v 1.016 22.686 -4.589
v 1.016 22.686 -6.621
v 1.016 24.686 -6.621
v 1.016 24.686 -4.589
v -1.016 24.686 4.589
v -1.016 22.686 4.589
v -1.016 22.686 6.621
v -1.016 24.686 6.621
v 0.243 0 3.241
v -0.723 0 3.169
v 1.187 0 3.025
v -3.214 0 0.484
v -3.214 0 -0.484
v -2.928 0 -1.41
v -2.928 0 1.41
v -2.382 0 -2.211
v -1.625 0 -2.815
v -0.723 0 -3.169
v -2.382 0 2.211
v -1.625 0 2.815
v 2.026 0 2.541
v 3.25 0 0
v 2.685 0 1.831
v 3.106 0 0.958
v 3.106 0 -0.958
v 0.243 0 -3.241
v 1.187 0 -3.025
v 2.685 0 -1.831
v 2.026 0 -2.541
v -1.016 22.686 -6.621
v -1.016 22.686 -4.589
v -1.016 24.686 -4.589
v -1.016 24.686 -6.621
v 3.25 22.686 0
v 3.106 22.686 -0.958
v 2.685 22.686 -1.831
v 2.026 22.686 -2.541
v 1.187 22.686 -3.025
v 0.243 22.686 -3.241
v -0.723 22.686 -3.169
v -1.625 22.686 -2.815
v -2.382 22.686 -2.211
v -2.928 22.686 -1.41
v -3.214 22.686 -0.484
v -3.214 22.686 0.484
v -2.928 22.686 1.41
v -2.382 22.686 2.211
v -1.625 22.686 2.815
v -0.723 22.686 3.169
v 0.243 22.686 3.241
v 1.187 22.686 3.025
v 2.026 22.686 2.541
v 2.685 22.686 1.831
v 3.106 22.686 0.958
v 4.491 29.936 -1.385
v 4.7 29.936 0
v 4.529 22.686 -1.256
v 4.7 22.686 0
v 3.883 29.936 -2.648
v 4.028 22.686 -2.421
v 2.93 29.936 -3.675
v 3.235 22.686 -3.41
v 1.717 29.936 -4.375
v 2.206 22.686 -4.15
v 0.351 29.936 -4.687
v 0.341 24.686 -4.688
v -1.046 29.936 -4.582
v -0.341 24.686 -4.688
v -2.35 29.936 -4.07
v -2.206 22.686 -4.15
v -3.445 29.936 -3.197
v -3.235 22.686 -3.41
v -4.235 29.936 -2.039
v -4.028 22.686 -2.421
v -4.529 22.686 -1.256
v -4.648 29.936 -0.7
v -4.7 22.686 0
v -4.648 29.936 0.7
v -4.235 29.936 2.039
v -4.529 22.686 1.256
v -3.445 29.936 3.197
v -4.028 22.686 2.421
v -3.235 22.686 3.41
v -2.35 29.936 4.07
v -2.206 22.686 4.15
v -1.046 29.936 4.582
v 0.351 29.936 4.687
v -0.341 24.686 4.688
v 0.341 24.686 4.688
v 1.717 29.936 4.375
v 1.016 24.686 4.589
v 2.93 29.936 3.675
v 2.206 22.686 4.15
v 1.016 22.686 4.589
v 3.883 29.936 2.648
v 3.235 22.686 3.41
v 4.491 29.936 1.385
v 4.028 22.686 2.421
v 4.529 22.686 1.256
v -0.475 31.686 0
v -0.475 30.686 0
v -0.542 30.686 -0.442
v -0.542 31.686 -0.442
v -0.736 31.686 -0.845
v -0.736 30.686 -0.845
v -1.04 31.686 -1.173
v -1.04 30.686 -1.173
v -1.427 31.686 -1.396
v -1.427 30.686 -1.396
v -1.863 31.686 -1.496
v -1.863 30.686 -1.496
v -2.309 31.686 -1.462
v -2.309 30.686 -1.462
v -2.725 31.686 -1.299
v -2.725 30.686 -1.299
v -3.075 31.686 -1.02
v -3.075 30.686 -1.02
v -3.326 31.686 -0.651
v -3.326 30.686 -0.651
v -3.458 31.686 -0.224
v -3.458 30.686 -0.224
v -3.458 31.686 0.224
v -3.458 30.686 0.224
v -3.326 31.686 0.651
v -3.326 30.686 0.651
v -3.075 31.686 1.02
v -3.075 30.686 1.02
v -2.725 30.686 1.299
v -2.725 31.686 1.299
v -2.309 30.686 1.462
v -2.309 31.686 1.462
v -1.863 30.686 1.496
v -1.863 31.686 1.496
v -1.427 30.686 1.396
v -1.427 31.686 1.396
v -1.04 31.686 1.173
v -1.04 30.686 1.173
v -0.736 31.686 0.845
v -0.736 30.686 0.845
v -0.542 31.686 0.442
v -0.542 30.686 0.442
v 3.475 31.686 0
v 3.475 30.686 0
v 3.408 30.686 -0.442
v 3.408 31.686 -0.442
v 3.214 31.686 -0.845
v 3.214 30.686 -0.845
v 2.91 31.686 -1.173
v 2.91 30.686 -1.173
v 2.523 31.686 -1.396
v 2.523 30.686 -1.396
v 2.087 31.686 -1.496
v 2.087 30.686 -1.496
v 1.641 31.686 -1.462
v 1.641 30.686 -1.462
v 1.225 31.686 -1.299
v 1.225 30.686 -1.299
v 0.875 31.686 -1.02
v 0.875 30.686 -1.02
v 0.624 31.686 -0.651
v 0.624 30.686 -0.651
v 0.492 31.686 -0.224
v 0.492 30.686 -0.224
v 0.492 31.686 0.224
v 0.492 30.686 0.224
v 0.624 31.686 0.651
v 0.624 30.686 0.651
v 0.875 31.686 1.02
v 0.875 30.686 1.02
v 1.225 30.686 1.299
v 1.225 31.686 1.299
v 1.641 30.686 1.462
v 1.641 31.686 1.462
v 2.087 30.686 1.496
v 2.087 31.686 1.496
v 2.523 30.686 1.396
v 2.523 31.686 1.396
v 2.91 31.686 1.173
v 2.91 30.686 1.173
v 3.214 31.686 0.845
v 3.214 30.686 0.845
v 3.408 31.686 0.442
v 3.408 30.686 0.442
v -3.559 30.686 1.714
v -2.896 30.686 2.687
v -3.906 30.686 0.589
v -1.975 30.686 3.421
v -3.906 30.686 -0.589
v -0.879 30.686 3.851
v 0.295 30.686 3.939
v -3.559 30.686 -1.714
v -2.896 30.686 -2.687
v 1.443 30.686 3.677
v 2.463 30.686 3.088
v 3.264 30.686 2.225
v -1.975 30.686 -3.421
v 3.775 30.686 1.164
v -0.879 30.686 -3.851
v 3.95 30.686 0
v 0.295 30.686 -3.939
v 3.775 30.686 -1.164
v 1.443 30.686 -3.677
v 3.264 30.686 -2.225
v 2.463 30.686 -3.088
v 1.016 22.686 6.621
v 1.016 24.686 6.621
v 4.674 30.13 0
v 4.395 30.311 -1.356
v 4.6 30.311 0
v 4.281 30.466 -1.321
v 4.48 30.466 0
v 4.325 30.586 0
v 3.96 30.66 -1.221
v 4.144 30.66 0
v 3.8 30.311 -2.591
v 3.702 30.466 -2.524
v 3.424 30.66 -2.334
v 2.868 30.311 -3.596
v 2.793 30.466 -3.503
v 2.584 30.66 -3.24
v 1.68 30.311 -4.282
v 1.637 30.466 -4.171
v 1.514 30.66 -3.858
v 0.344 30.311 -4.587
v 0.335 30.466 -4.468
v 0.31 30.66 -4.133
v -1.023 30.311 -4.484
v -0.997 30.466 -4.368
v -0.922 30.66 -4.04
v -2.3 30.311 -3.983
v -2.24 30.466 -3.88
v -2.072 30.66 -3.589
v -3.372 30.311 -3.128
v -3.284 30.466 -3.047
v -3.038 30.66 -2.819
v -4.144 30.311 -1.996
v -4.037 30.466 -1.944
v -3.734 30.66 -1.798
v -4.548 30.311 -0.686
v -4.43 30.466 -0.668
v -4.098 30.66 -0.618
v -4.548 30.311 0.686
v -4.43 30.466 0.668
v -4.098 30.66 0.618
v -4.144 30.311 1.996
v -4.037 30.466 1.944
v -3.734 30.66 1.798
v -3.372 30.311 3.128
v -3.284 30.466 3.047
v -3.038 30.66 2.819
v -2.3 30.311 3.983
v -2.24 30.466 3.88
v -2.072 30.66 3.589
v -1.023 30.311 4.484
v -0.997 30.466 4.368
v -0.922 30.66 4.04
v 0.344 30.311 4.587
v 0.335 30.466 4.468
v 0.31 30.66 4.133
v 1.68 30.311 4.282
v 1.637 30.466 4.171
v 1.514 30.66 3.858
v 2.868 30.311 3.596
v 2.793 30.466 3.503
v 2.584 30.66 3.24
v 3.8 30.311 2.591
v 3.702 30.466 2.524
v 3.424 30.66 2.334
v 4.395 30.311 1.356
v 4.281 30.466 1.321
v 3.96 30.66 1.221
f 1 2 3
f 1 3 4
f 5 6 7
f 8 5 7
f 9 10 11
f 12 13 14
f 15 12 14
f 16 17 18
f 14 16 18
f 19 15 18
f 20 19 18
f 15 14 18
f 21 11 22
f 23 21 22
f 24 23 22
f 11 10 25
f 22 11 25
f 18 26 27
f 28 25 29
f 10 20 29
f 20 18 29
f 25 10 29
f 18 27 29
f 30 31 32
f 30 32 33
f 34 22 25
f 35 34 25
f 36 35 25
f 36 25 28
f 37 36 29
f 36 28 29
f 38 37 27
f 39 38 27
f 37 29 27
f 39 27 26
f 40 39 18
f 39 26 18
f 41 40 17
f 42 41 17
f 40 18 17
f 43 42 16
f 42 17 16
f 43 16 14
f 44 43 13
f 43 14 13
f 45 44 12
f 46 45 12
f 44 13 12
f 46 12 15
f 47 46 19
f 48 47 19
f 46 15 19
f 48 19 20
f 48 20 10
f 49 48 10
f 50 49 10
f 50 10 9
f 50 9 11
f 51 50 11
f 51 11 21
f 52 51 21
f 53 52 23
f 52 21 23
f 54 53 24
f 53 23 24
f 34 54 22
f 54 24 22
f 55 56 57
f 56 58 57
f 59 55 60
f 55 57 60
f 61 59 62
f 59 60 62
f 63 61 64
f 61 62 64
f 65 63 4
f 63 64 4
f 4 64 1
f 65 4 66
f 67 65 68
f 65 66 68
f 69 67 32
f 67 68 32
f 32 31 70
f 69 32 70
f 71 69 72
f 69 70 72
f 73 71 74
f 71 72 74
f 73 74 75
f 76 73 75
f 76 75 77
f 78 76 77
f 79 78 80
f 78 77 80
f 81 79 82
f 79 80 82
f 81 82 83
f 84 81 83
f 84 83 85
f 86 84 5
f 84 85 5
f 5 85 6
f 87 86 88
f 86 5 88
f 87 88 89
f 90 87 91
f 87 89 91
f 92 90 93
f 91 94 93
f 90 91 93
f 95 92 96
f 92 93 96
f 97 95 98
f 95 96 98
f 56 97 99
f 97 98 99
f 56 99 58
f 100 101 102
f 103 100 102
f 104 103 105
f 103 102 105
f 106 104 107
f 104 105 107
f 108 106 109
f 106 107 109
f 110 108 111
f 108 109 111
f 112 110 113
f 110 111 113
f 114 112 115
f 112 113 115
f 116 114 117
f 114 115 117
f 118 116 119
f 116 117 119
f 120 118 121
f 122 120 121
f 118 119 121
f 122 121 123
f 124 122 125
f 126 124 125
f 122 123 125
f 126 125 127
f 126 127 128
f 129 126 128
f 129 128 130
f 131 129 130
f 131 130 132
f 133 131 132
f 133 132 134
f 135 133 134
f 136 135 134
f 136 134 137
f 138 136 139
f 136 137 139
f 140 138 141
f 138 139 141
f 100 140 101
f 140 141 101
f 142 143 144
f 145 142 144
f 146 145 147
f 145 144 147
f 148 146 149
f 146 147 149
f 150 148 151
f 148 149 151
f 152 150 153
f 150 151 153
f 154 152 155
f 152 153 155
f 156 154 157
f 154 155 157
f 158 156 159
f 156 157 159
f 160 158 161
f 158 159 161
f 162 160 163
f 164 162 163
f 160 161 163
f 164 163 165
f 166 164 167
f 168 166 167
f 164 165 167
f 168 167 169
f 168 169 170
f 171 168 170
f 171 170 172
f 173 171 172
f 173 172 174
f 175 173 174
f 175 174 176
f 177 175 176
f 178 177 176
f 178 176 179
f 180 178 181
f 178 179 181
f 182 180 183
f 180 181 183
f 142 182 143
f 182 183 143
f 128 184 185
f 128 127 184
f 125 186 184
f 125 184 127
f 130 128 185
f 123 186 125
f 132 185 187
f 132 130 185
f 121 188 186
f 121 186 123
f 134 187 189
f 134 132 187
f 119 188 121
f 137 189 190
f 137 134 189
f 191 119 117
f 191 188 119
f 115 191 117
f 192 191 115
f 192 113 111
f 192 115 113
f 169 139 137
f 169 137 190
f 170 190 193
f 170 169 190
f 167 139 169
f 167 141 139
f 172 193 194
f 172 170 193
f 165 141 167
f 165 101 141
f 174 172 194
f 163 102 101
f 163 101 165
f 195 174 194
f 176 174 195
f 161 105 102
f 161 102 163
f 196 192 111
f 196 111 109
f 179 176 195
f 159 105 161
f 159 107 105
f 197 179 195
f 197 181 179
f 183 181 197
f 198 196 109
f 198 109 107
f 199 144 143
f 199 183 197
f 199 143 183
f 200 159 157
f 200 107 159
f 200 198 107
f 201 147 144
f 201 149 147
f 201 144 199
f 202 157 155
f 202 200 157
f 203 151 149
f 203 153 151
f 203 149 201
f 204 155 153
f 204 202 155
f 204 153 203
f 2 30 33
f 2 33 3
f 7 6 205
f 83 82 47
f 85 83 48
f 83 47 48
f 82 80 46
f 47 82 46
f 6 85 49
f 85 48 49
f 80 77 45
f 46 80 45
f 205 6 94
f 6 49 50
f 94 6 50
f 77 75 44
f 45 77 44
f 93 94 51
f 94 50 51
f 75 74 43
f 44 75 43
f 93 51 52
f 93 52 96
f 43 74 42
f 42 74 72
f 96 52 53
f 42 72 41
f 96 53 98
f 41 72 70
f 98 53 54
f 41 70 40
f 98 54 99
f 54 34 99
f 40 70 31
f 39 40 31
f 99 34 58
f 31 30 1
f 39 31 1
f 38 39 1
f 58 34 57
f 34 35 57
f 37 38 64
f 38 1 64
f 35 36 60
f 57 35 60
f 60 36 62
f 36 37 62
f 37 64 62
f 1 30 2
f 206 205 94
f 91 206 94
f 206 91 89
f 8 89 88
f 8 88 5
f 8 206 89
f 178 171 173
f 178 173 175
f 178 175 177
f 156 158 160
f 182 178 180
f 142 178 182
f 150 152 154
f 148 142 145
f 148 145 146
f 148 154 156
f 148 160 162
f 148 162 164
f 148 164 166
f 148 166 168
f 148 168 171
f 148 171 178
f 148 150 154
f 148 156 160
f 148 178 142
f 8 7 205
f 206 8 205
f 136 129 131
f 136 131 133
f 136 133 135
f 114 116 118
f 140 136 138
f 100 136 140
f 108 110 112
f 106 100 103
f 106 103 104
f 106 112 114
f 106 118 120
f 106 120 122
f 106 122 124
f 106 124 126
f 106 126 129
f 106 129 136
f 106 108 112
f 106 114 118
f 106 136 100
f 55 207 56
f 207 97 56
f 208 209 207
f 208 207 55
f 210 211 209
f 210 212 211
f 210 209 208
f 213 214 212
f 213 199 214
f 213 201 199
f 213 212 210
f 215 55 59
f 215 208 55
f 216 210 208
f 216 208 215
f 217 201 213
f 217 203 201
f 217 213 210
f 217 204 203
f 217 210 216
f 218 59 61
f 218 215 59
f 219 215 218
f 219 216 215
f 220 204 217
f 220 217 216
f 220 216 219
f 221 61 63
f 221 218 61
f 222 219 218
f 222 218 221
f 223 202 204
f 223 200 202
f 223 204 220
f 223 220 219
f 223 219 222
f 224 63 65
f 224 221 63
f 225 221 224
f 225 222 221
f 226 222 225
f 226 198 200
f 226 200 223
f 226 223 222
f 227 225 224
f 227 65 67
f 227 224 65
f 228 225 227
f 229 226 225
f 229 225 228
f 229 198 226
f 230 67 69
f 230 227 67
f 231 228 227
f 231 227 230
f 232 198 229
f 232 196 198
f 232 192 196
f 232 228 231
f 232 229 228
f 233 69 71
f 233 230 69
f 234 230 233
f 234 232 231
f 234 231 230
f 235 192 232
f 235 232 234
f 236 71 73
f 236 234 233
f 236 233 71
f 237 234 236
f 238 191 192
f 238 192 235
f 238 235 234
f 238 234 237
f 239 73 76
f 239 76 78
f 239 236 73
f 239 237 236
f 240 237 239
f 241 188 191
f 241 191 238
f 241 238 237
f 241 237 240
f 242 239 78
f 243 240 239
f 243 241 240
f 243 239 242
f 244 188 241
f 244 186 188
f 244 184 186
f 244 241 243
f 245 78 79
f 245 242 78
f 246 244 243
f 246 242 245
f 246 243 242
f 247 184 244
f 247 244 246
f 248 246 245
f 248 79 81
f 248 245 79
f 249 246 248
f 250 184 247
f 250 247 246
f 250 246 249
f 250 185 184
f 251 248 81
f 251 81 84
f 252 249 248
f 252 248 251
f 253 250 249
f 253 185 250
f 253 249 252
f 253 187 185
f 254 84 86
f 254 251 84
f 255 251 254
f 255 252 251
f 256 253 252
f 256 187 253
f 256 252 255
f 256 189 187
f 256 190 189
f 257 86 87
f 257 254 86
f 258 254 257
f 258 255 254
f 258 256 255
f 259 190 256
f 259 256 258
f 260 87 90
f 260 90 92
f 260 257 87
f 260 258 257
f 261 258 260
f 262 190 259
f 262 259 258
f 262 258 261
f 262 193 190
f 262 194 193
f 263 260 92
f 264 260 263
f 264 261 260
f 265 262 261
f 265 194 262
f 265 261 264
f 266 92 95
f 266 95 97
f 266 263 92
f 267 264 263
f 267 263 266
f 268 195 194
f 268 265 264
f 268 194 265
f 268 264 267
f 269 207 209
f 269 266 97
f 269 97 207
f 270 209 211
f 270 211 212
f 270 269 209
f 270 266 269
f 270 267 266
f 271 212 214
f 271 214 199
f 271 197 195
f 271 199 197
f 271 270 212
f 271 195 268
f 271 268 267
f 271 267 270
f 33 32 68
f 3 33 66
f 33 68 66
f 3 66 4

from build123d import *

# Parameters (mm, degrees)
SKETCH1_R           = 3.25
BOSS_EXTRUDE1_DEPTH = 22.686
SKETCH6_R           = 4.7
BOSS_EXTRUDE2_DEPTH = 8
FILLET2_R           = 0.75
SKETCH7_R           = 1.5
BOSS_EXTRUDE3_DEPTH = 1
BOSS_EXTRUDE4_DEPTH = 2


with BuildPart() as part:
    # Sketch1 → Boss-Extrude1 (new body)
    with BuildSketch(Plane(origin=(0, 0, 0), x_dir=(1, 0, 0), z_dir=(0, 1, 0))):
        Circle(SKETCH1_R)
    extrude(amount=BOSS_EXTRUDE1_DEPTH)

    # Sketch6 → Boss-Extrude2 (add)
    with BuildSketch(Plane(origin=(0, 22.686, 0), x_dir=(1, 0, 0), z_dir=(0, 1, 0))):
        Circle(SKETCH6_R)
    extrude(amount=BOSS_EXTRUDE2_DEPTH)

    # Fillet2
    fillet2_edges = [part.edges().sort_by_distance(p)[0] for p in [
        (-4.7, 30.686, 0),
    ]]
    fillet(fillet2_edges, radius=FILLET2_R)

    # Sketch7 → Boss-Extrude3 (add)
    with BuildSketch(Plane(origin=(0, 30.686, 0), x_dir=(1, 0, 0), z_dir=(0, 1, 0))):
        with Locations((-1.975, 0)):
            Circle(SKETCH7_R)
        with Locations((1.975, 0)):
            Circle(SKETCH7_R)
    extrude(amount=BOSS_EXTRUDE3_DEPTH)

    # Sketch8 → Boss-Extrude4 (add)
    with BuildSketch(Plane.XZ.offset(-22.686)):
        with BuildLine():
            Line((-1.016, 4.588871757), (-1.016, 6.620871757))
            Line((-1.016, 6.620871757), (1.016, 6.620871757))
            Line((1.016, 6.620871757), (1.016, 4.588871757))
            ThreePointArc((1.016, 4.588871757), (0, 4.7), (-1.016, 4.588871757))
        make_face()
        with BuildLine():
            Line((1.016, -6.620871757), (1.016, -4.588871757))
            ThreePointArc((1.016, -4.588871757), (0, -4.7), (-1.016, -4.588871757))
            Line((-1.016, -4.588871757), (-1.016, -6.620871757))
            Line((-1.016, -6.620871757), (1.016, -6.620871757))
        make_face()
    extrude(amount=-BOSS_EXTRUDE4_DEPTH)


solid = part.part
